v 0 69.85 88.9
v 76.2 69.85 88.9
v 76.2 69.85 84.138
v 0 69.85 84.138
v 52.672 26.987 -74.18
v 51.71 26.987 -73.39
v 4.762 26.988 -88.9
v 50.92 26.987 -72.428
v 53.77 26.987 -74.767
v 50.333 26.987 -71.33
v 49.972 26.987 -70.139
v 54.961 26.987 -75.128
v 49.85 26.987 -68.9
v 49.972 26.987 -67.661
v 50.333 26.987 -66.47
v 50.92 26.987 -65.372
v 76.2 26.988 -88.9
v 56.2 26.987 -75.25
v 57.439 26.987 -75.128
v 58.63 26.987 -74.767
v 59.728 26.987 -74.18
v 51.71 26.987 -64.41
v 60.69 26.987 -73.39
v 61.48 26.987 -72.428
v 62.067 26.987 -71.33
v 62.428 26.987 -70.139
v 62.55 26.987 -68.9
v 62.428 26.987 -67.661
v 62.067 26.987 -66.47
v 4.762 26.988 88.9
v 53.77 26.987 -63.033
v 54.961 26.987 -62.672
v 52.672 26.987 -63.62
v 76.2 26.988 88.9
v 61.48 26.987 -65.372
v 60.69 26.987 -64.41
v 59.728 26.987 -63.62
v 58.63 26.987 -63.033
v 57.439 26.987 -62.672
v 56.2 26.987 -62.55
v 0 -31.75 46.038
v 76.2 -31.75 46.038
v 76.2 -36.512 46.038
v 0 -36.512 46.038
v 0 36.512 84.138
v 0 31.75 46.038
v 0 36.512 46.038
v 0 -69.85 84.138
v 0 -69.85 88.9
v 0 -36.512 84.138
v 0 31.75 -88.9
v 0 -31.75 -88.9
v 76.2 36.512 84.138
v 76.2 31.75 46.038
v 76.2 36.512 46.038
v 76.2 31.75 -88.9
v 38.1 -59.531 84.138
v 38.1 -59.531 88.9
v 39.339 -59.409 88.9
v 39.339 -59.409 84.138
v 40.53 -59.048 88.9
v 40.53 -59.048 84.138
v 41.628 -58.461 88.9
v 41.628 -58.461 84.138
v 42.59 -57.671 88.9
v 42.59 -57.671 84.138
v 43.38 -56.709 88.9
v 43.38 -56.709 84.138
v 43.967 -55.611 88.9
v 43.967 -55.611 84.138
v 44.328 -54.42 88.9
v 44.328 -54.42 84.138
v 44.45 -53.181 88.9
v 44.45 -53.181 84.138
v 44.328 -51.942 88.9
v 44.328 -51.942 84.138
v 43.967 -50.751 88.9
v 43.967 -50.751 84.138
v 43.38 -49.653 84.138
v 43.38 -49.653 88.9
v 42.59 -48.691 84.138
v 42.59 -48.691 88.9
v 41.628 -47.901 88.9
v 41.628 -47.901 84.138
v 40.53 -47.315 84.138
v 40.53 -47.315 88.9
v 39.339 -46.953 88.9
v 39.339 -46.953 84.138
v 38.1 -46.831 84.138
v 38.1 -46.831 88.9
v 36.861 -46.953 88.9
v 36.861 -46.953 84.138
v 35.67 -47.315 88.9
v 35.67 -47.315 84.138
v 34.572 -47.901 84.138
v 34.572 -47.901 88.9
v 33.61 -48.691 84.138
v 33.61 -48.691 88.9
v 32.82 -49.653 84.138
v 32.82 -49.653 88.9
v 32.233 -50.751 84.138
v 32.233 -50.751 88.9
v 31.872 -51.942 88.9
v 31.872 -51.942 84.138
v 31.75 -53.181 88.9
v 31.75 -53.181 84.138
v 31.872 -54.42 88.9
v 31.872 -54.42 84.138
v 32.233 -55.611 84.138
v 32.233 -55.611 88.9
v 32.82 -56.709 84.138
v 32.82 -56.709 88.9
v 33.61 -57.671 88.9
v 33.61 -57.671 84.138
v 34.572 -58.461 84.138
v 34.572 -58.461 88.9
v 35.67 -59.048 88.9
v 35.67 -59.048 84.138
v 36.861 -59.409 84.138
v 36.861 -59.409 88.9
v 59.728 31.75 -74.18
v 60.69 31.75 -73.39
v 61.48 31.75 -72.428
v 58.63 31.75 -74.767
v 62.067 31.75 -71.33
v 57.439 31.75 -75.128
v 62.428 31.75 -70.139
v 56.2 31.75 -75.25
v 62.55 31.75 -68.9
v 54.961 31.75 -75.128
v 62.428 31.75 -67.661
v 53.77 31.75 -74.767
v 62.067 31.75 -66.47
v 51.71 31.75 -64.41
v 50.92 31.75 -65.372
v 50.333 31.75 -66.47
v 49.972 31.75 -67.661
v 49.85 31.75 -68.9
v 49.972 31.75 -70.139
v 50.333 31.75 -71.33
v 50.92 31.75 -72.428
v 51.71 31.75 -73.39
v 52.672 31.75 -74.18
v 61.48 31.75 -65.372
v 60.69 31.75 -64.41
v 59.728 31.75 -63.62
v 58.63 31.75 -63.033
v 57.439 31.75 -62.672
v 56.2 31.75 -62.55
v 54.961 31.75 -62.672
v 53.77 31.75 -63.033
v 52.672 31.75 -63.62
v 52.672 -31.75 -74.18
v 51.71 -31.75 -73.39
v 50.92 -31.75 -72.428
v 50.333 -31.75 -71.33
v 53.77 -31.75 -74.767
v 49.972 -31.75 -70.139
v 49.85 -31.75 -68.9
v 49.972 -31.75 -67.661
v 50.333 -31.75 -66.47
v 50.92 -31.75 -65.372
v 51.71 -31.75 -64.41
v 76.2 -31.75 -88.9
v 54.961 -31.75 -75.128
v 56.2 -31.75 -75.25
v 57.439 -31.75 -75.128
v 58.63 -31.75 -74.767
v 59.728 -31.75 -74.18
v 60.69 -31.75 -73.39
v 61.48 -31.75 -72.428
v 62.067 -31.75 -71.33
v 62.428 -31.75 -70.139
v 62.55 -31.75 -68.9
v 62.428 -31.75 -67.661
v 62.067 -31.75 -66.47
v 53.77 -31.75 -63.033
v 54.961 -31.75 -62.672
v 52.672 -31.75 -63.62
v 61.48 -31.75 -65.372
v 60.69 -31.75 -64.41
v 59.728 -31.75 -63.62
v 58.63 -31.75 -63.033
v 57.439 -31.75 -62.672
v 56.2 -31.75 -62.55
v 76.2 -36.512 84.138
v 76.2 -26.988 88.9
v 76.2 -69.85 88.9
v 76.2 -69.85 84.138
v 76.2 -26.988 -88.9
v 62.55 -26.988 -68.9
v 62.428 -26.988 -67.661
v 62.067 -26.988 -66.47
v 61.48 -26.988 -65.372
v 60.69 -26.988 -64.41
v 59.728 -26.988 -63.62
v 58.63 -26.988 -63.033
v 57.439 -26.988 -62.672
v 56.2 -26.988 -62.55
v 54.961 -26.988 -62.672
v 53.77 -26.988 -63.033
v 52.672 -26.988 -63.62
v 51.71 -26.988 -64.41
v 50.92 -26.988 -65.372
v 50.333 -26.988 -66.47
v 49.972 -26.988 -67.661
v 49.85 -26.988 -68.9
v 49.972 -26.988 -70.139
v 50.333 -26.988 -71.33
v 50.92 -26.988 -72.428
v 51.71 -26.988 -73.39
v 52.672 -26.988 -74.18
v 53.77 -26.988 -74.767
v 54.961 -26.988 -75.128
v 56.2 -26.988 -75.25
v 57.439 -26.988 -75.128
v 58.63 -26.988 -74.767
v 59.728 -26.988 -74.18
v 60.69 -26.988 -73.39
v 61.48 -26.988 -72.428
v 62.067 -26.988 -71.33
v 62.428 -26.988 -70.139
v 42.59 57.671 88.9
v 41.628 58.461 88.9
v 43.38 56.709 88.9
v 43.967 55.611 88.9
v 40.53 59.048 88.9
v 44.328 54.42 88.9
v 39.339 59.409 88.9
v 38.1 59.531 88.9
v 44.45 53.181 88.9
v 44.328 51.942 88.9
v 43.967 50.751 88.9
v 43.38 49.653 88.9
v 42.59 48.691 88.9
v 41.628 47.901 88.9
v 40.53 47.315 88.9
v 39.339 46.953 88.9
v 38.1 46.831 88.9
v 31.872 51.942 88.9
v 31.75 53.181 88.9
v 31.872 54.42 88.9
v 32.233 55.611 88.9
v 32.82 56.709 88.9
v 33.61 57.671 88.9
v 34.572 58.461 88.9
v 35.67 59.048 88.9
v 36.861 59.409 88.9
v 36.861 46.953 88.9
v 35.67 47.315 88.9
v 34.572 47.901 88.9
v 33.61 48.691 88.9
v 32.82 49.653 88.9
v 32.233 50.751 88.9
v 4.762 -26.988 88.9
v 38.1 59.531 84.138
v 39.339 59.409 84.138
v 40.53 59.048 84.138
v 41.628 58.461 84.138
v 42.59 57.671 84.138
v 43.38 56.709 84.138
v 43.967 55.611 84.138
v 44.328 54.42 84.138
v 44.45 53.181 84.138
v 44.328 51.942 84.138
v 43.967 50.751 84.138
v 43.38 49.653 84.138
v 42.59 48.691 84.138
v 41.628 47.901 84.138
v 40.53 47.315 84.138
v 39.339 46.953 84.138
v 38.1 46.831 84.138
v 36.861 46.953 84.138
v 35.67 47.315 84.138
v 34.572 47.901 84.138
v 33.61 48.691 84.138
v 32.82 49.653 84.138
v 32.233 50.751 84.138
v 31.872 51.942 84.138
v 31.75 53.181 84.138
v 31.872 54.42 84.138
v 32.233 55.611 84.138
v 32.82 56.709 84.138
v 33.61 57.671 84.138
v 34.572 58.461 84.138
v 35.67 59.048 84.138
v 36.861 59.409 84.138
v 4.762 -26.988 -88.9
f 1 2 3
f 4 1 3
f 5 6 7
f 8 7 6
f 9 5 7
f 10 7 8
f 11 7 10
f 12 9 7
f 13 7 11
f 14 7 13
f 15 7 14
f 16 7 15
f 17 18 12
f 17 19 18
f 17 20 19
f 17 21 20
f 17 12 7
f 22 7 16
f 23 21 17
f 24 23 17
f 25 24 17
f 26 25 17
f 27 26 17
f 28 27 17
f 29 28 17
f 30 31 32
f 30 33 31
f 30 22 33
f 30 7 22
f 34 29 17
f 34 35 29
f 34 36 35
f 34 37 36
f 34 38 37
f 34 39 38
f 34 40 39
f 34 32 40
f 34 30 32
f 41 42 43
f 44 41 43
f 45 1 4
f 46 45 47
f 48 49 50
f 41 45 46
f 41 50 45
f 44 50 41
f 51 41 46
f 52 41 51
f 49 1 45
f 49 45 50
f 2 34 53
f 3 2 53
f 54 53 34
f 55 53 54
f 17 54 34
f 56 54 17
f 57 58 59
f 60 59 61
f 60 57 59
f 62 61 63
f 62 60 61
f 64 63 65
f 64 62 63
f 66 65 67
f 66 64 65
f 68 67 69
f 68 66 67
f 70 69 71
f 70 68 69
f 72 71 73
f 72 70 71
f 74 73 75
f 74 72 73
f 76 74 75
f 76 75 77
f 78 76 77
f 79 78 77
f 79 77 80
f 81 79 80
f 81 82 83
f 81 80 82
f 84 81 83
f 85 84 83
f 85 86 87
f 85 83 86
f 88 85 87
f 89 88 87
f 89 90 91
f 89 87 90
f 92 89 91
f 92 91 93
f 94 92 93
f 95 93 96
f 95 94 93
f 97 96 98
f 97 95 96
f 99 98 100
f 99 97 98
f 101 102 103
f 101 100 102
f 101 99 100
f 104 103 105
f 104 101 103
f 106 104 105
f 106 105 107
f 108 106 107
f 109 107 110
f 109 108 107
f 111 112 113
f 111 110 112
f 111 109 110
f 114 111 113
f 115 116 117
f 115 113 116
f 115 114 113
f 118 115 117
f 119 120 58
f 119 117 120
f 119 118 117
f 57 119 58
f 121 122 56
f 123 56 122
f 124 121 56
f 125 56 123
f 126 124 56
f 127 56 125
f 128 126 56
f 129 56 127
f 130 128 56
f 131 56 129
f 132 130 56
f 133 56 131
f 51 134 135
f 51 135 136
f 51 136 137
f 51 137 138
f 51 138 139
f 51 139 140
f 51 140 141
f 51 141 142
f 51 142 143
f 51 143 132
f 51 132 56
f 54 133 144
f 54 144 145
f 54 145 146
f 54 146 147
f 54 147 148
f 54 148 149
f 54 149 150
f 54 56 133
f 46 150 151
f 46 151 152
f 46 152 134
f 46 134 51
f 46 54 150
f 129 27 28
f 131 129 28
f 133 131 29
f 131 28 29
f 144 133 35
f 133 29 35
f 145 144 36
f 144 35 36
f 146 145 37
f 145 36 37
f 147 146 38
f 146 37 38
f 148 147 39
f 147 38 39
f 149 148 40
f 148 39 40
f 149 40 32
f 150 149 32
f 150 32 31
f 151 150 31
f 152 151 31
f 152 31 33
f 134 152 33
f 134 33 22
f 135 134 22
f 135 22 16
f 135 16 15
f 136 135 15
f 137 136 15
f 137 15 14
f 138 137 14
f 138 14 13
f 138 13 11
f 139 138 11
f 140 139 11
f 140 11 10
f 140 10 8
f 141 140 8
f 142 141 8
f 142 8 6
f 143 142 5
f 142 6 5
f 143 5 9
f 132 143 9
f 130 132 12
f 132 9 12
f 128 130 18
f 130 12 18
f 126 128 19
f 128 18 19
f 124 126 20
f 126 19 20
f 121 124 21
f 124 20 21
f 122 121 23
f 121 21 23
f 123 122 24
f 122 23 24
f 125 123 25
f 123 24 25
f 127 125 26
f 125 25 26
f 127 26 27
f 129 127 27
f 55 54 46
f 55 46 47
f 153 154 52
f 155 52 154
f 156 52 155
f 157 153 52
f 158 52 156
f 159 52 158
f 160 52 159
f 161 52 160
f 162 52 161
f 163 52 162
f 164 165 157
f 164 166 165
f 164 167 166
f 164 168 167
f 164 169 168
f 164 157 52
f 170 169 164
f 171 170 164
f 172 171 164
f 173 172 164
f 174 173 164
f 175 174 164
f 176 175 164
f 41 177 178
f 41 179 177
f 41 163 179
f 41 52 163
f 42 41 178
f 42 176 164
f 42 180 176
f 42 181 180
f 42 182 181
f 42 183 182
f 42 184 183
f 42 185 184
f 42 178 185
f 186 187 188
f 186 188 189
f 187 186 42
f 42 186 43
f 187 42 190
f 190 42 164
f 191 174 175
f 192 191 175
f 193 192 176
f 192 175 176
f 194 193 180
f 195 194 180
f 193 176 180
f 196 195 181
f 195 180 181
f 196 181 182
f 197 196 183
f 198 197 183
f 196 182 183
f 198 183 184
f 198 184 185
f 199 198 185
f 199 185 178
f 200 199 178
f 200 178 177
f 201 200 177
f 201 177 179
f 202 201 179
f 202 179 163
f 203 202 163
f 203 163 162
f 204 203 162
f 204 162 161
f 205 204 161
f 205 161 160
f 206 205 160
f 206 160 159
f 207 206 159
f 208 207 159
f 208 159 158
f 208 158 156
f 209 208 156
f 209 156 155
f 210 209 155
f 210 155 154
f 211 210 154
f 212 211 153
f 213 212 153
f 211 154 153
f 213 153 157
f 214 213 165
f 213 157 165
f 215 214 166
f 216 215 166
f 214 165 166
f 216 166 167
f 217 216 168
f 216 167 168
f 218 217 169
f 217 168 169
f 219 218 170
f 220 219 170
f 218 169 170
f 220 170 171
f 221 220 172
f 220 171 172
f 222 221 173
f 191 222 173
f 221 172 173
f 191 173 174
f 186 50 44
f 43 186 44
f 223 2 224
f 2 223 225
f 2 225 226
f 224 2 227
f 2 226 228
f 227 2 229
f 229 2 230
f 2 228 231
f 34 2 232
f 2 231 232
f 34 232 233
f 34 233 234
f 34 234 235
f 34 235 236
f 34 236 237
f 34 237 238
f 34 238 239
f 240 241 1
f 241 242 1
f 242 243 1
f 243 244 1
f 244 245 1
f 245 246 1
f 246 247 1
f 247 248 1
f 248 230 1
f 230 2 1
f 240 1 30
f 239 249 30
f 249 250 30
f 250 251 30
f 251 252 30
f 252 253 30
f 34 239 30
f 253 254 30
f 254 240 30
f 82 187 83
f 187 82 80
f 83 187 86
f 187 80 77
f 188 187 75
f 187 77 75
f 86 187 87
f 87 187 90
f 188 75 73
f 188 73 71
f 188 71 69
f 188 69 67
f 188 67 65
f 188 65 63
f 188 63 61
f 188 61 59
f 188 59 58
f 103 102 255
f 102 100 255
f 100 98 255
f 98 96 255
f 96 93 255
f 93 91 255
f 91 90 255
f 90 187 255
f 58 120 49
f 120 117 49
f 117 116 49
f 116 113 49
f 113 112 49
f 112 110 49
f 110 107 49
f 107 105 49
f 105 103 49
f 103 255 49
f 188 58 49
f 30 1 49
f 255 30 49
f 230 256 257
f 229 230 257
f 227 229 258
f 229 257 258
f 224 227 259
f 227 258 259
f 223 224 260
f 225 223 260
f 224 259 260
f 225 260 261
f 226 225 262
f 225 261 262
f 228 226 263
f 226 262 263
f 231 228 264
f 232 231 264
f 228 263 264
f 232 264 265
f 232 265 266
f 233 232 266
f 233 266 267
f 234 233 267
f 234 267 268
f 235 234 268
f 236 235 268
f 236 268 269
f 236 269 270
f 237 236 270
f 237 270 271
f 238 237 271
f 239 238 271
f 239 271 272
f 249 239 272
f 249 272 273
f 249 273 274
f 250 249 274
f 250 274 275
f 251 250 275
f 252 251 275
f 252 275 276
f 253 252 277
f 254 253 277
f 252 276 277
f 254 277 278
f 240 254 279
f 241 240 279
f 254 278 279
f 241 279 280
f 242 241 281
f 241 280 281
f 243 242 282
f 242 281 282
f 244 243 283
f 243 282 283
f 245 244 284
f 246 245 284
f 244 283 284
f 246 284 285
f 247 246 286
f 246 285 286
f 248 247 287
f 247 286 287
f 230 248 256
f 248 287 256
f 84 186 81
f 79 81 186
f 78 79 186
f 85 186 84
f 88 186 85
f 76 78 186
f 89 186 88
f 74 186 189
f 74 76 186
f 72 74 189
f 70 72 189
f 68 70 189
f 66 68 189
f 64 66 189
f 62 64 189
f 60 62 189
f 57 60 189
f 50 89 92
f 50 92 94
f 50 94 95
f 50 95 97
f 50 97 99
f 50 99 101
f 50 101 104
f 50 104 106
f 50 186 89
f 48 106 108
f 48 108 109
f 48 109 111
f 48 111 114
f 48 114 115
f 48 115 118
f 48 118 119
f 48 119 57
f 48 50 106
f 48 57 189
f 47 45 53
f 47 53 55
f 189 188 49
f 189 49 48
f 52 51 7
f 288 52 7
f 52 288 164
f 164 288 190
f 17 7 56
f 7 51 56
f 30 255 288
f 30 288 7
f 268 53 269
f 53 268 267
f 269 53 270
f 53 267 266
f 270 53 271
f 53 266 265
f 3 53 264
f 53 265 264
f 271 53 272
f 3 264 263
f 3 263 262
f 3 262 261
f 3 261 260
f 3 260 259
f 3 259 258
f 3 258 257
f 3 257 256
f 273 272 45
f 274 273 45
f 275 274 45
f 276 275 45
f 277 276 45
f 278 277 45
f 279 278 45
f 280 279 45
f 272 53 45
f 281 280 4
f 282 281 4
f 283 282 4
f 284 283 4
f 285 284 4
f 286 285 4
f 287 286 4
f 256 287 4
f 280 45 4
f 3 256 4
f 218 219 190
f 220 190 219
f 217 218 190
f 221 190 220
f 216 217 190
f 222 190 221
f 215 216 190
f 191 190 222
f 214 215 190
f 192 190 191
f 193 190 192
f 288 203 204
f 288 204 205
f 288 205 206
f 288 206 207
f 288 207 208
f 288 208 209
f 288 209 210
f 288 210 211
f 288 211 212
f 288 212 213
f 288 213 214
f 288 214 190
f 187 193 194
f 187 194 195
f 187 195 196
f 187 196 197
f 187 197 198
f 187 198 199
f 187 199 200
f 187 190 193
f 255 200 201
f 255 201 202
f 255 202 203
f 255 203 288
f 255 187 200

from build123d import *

# Parameters (mm, degrees)
SALIENTE_EXTRUIR1_DEPTH = 88.9
CROQUIS2_W              = 38.1
CROQUIS2_H              = 4.7625
CROQUIS2_W_2            = 4.7625
CROQUIS2_H_2            = 38.1
SALIENTE_EXTRUIR2_DEPTH = 76.2
CROQUIS4_R              = 6.35
CORTAR_EXTRUIR2_DEPTH   = 77.8
CROQUIS5_R              = 6.35
CORTAR_EXTRUIR3_DEPTH   = 77.8


with BuildPart() as part:
    # Croquis1 → Saliente-Extruir1 (new, symmetric)
    with BuildSketch(Plane.XY):
        Polygon((0, 31.75), (0, -31.75), (76.2, -31.75), (76.2, -26.9875), (4.7625, -26.9875), (4.7625, 26.9875), (76.2, 26.9875), (76.2, 31.75), align=None)
    extrude(amount=SALIENTE_EXTRUIR1_DEPTH, both=True)

    # Croquis2 → Saliente-Extruir2 (add, through all)
    with BuildSketch(Plane(origin=(0, 0, 0), x_dir=(0, 0, -1), z_dir=(1, 0, 0))):
        with Locations((-65.0875, 34.13125)):
            Rectangle(CROQUIS2_W, CROQUIS2_H)
        with Locations((-86.51875, 50.8)):
            Rectangle(CROQUIS2_W_2, CROQUIS2_H_2)
    saliente_extruir2 = extrude(amount=SALIENTE_EXTRUIR2_DEPTH)

    # Croquis4 → Cortar-Extruir2 (cut)
    with BuildSketch(Plane(origin=(0, 0, 84.1375), x_dir=(-1, 0, 0), z_dir=(0, 0, -1))):
        with Locations(Location((-38.1, 53.18125, 0), (0, 0, 90))):
            Circle(CROQUIS4_R)
    cortar_extruir2 = extrude(amount=-CORTAR_EXTRUIR2_DEPTH, mode=Mode.SUBTRACT)

    # Simetría3: Saliente-Extruir2, Cortar-Extruir2 across plane
    add(saliente_extruir2.mirror(Plane.ZX))
    add(cortar_extruir2.mirror(Plane.ZX), mode=Mode.SUBTRACT)

    # Croquis5 → Cortar-Extruir3 (cut)
    with BuildSketch(Plane(origin=(0, -31.75, 0), x_dir=(-1, 0, 0), z_dir=(0, -1, 0))):
        with Locations(Location((-56.2, 68.9, 0), (0, 0, 180))):
            Circle(CROQUIS5_R)
    extrude(amount=-CORTAR_EXTRUIR3_DEPTH, mode=Mode.SUBTRACT)


solid = part.part
